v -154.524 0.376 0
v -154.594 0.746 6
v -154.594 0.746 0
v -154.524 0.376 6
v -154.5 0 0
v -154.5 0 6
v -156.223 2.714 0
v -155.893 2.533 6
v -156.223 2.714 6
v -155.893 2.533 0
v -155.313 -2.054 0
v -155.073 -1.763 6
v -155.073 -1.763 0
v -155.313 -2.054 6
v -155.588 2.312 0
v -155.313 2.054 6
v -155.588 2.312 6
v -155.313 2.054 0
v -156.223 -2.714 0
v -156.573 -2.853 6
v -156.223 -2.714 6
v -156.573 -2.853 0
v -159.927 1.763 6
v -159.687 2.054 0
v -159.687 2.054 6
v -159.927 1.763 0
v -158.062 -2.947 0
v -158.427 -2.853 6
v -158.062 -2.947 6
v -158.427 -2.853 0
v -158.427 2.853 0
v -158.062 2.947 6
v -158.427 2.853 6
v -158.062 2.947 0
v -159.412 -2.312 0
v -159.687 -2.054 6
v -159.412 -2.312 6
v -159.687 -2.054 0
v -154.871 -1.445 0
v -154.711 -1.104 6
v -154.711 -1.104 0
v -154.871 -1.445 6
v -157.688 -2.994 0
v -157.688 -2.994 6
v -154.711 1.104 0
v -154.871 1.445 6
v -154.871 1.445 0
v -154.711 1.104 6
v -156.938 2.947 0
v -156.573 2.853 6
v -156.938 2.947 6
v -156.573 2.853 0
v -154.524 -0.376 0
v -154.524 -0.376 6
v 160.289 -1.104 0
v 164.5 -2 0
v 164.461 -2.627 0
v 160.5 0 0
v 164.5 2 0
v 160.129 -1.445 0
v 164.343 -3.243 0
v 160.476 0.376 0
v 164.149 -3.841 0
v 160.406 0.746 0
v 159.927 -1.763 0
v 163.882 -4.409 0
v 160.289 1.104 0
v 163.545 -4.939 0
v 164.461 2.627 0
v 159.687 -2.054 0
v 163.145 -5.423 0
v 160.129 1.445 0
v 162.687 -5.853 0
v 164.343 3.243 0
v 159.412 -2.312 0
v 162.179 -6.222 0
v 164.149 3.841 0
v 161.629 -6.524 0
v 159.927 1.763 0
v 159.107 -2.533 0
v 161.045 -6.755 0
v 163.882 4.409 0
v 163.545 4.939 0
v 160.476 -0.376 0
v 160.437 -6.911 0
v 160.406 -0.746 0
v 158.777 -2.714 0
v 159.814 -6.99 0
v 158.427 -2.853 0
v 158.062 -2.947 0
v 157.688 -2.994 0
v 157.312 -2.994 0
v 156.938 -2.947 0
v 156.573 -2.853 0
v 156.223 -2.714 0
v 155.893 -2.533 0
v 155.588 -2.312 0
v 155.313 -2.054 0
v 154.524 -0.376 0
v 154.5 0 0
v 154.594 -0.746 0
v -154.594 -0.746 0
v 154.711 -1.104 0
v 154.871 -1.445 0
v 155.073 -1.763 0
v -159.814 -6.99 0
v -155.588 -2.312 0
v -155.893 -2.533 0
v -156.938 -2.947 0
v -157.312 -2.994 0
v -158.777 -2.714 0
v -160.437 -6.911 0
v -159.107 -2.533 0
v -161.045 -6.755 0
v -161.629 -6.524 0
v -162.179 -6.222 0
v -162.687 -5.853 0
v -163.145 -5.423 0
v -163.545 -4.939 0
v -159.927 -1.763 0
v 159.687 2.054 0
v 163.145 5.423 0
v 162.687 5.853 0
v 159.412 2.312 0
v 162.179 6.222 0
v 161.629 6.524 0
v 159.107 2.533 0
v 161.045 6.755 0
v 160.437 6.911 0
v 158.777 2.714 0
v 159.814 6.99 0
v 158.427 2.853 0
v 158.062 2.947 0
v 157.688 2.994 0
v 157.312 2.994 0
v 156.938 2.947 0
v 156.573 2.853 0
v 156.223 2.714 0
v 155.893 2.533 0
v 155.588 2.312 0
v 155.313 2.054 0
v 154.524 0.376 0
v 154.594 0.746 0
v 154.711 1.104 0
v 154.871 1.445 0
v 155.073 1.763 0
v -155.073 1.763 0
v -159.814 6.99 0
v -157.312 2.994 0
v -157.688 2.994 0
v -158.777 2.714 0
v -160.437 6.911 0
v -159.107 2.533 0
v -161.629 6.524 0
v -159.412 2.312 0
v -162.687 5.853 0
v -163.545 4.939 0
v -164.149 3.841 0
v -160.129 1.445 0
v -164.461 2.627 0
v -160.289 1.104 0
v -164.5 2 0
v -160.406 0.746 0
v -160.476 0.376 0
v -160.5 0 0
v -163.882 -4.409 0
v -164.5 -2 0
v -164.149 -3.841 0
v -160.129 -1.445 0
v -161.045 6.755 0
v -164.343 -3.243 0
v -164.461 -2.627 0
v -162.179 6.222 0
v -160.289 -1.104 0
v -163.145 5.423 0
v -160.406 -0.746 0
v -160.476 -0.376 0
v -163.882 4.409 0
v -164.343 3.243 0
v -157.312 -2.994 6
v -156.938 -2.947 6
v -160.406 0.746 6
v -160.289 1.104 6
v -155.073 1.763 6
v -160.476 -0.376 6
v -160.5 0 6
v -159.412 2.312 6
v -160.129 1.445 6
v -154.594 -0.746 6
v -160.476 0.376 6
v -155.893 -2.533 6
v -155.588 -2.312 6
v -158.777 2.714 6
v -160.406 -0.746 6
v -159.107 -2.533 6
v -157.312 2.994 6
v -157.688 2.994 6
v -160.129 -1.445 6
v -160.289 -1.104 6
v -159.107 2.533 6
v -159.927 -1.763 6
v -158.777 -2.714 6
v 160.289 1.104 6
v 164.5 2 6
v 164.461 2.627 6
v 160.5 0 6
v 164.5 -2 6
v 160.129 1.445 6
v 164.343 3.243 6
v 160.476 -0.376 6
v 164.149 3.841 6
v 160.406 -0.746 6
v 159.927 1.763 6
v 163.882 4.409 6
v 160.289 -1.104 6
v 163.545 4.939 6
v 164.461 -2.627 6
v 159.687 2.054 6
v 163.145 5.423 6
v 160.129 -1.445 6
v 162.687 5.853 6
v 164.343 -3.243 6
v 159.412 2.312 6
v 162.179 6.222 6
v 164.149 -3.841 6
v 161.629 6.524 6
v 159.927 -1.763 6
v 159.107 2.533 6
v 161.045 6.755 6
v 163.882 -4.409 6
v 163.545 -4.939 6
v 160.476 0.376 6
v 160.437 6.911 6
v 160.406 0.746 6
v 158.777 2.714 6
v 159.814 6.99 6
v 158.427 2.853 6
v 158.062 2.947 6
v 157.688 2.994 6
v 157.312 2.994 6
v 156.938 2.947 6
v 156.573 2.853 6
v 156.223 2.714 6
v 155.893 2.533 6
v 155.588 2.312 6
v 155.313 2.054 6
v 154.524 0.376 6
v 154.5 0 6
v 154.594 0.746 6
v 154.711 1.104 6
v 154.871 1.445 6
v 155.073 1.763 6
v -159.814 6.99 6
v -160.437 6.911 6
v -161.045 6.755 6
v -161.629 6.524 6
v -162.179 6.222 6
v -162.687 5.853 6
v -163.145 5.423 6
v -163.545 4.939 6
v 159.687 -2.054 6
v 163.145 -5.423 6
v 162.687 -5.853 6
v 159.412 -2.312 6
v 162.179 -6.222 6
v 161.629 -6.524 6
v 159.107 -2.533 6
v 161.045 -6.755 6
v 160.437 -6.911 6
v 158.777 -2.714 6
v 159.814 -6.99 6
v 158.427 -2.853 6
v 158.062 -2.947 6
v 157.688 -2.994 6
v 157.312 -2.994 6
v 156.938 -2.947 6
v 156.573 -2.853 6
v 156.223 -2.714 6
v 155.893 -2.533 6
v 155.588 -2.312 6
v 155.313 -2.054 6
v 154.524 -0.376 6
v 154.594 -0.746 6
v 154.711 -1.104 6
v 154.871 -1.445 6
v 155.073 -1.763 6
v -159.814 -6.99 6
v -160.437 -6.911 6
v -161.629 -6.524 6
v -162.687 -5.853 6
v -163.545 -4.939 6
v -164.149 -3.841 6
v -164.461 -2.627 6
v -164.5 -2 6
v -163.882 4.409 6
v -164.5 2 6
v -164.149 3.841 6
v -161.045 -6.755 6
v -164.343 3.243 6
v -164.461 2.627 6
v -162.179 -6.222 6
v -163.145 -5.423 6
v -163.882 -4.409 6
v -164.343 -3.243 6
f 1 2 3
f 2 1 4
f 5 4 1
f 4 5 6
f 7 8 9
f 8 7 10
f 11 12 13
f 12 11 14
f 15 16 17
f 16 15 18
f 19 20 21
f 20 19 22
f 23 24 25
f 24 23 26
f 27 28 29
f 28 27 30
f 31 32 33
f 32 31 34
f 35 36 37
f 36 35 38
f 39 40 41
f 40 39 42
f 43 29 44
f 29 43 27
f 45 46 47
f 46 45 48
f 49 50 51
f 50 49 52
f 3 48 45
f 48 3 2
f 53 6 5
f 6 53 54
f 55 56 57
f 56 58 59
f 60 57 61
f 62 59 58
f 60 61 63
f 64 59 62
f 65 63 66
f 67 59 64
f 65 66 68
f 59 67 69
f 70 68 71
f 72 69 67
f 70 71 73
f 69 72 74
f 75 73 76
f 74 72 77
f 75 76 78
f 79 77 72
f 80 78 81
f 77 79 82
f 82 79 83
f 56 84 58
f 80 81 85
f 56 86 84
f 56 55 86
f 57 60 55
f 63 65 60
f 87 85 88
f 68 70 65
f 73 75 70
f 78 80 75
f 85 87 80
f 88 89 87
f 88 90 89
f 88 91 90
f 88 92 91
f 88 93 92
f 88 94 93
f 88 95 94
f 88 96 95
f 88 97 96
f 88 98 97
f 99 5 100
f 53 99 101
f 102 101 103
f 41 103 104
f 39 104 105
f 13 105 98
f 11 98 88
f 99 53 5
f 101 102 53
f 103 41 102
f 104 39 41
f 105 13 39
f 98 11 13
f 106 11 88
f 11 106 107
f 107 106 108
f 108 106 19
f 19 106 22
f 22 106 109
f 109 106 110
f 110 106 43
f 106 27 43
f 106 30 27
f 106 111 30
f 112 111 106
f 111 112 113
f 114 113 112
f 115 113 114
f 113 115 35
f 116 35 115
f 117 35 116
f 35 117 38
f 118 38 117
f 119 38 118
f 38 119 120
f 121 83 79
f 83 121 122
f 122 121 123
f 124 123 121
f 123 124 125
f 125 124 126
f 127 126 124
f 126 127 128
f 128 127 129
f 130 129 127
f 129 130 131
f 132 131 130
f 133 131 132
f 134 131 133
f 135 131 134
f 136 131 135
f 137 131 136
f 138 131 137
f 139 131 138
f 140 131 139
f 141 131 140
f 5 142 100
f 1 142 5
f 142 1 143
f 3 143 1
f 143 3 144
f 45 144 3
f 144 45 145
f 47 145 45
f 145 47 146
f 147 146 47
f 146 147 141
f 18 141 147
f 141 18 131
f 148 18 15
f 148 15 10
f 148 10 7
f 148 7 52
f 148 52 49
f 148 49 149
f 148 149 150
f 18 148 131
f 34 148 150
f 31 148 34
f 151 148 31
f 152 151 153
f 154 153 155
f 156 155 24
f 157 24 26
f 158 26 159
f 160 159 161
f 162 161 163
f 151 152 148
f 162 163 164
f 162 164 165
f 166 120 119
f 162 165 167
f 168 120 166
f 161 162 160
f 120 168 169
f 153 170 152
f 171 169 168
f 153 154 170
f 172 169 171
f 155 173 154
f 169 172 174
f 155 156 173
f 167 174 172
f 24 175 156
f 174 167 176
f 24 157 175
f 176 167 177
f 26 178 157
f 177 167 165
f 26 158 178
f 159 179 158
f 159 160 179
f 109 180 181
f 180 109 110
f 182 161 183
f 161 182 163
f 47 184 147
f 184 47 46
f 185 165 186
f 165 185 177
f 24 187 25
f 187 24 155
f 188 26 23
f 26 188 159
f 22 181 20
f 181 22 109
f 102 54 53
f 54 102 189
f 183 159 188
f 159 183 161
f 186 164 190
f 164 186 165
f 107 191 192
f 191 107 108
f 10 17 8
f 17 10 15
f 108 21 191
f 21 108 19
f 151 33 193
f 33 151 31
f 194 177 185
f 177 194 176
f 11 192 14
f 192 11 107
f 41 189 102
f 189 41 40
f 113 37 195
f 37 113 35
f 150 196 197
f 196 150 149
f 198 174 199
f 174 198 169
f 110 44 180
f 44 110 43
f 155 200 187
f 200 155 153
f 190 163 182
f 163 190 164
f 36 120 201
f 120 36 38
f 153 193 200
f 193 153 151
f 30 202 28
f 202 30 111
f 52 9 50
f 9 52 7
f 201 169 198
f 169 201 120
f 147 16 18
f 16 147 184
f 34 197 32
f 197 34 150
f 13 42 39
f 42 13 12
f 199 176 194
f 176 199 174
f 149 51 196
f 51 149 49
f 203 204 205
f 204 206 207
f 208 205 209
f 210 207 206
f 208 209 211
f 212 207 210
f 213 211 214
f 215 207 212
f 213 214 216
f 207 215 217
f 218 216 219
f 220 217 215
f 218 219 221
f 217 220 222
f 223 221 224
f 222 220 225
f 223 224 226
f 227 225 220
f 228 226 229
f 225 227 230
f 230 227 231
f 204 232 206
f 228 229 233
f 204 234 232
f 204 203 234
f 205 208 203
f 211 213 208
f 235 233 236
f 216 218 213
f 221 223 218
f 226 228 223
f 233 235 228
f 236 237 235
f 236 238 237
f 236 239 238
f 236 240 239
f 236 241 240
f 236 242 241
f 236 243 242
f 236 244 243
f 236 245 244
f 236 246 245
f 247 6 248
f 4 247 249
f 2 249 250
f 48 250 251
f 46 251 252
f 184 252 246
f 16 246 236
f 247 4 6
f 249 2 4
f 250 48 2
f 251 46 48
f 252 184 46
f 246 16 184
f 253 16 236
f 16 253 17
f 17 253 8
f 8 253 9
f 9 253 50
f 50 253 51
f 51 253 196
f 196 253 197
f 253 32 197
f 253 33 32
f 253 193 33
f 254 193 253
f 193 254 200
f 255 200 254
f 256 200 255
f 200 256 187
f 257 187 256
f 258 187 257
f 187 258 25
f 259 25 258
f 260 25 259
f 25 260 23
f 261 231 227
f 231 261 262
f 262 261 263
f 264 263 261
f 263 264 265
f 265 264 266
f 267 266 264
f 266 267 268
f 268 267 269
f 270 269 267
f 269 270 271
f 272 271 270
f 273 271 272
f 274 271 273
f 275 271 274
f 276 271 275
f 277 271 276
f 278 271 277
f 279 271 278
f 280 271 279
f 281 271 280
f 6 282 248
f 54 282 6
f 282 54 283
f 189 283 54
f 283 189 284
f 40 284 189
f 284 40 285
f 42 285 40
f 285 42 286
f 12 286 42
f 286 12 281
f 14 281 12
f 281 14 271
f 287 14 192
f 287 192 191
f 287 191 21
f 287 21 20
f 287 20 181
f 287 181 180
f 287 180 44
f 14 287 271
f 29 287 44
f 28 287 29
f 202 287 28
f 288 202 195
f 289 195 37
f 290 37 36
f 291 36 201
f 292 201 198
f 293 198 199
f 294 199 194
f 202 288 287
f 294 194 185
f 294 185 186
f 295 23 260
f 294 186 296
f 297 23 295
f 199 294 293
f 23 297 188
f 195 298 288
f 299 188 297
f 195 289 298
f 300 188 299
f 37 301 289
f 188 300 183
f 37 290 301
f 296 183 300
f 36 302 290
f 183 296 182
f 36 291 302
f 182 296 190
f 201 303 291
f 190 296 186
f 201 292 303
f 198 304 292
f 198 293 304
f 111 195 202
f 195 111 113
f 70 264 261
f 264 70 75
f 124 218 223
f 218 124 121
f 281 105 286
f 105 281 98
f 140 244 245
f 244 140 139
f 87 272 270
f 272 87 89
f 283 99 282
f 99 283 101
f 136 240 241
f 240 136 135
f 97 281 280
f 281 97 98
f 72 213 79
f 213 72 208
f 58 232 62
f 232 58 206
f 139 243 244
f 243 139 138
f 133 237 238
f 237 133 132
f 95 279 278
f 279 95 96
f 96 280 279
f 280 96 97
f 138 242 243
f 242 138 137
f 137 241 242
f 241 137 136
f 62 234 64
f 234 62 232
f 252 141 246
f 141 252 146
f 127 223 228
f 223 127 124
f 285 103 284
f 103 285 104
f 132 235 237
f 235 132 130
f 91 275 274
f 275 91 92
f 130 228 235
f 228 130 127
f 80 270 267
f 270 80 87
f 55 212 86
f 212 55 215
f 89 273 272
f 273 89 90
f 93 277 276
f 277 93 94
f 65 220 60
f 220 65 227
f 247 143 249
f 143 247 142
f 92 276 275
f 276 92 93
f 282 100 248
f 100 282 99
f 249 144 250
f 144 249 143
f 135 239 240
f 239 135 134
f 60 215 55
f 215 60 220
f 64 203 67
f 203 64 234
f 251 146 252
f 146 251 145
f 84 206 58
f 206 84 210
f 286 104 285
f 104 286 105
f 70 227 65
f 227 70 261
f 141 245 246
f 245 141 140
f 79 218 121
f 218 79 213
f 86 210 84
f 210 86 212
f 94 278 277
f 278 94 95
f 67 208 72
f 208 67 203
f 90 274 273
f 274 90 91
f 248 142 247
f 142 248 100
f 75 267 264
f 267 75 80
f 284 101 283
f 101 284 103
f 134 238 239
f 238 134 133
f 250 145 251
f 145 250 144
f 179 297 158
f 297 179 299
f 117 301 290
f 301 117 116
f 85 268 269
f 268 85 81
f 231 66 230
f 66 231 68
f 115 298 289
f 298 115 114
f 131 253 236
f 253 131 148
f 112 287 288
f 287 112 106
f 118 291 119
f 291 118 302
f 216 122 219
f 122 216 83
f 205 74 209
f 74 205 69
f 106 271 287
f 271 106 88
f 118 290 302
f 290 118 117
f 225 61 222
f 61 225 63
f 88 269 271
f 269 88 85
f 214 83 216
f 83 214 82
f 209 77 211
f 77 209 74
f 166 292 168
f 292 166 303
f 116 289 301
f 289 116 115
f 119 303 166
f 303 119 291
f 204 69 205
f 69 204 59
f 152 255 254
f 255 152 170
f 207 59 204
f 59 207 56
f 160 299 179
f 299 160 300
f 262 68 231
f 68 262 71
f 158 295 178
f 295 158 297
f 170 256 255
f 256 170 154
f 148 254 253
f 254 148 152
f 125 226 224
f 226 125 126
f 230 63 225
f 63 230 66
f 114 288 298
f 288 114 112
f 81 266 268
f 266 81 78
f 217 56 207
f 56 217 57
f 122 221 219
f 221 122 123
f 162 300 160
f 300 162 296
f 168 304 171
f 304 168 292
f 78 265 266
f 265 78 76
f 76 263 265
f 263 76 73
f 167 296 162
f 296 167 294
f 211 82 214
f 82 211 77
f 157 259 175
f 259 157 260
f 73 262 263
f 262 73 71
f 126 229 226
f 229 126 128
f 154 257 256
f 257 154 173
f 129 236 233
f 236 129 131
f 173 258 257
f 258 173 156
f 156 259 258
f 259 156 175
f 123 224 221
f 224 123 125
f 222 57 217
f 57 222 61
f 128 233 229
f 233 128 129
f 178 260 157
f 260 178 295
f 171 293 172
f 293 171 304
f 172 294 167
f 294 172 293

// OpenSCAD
$fn = 50;


difference() {
	union() {
		hull() {
			translate(v = [-159.5000000000, 2.0000000000, 0]) {
				cylinder(h = 6, r = 5);
			}
			translate(v = [159.5000000000, 2.0000000000, 0]) {
				cylinder(h = 6, r = 5);
			}
			translate(v = [-159.5000000000, -2.0000000000, 0]) {
				cylinder(h = 6, r = 5);
			}
			translate(v = [159.5000000000, -2.0000000000, 0]) {
				cylinder(h = 6, r = 5);
			}
		}
	}
	union() {
		translate(v = [-157.5000000000, 0.0000000000, 0]) {
			cylinder(h = 6, r = 3.0000000000);
		}
		translate(v = [157.5000000000, 0.0000000000, 0]) {
			cylinder(h = 6, r = 3.0000000000);
		}
		translate(v = [-157.5000000000, 0.0000000000, 0]) {
			cylinder(h = 6, r = 1.5000000000);
		}
		translate(v = [157.5000000000, 0.0000000000, 0]) {
			cylinder(h = 6, r = 1.5000000000);
		}
		translate(v = [-157.5000000000, 0.0000000000, 0]) {
			cylinder(h = 6, r = 1.5000000000);
		}
		translate(v = [157.5000000000, 0.0000000000, 0]) {
			cylinder(h = 6, r = 1.5000000000);
		}
		translate(v = [-157.5000000000, 0.0000000000, 0]) {
			cylinder(h = 6, r = 1.5000000000);
		}
		translate(v = [157.5000000000, 0.0000000000, 0]) {
			cylinder(h = 6, r = 1.5000000000);
		}
	}
}
